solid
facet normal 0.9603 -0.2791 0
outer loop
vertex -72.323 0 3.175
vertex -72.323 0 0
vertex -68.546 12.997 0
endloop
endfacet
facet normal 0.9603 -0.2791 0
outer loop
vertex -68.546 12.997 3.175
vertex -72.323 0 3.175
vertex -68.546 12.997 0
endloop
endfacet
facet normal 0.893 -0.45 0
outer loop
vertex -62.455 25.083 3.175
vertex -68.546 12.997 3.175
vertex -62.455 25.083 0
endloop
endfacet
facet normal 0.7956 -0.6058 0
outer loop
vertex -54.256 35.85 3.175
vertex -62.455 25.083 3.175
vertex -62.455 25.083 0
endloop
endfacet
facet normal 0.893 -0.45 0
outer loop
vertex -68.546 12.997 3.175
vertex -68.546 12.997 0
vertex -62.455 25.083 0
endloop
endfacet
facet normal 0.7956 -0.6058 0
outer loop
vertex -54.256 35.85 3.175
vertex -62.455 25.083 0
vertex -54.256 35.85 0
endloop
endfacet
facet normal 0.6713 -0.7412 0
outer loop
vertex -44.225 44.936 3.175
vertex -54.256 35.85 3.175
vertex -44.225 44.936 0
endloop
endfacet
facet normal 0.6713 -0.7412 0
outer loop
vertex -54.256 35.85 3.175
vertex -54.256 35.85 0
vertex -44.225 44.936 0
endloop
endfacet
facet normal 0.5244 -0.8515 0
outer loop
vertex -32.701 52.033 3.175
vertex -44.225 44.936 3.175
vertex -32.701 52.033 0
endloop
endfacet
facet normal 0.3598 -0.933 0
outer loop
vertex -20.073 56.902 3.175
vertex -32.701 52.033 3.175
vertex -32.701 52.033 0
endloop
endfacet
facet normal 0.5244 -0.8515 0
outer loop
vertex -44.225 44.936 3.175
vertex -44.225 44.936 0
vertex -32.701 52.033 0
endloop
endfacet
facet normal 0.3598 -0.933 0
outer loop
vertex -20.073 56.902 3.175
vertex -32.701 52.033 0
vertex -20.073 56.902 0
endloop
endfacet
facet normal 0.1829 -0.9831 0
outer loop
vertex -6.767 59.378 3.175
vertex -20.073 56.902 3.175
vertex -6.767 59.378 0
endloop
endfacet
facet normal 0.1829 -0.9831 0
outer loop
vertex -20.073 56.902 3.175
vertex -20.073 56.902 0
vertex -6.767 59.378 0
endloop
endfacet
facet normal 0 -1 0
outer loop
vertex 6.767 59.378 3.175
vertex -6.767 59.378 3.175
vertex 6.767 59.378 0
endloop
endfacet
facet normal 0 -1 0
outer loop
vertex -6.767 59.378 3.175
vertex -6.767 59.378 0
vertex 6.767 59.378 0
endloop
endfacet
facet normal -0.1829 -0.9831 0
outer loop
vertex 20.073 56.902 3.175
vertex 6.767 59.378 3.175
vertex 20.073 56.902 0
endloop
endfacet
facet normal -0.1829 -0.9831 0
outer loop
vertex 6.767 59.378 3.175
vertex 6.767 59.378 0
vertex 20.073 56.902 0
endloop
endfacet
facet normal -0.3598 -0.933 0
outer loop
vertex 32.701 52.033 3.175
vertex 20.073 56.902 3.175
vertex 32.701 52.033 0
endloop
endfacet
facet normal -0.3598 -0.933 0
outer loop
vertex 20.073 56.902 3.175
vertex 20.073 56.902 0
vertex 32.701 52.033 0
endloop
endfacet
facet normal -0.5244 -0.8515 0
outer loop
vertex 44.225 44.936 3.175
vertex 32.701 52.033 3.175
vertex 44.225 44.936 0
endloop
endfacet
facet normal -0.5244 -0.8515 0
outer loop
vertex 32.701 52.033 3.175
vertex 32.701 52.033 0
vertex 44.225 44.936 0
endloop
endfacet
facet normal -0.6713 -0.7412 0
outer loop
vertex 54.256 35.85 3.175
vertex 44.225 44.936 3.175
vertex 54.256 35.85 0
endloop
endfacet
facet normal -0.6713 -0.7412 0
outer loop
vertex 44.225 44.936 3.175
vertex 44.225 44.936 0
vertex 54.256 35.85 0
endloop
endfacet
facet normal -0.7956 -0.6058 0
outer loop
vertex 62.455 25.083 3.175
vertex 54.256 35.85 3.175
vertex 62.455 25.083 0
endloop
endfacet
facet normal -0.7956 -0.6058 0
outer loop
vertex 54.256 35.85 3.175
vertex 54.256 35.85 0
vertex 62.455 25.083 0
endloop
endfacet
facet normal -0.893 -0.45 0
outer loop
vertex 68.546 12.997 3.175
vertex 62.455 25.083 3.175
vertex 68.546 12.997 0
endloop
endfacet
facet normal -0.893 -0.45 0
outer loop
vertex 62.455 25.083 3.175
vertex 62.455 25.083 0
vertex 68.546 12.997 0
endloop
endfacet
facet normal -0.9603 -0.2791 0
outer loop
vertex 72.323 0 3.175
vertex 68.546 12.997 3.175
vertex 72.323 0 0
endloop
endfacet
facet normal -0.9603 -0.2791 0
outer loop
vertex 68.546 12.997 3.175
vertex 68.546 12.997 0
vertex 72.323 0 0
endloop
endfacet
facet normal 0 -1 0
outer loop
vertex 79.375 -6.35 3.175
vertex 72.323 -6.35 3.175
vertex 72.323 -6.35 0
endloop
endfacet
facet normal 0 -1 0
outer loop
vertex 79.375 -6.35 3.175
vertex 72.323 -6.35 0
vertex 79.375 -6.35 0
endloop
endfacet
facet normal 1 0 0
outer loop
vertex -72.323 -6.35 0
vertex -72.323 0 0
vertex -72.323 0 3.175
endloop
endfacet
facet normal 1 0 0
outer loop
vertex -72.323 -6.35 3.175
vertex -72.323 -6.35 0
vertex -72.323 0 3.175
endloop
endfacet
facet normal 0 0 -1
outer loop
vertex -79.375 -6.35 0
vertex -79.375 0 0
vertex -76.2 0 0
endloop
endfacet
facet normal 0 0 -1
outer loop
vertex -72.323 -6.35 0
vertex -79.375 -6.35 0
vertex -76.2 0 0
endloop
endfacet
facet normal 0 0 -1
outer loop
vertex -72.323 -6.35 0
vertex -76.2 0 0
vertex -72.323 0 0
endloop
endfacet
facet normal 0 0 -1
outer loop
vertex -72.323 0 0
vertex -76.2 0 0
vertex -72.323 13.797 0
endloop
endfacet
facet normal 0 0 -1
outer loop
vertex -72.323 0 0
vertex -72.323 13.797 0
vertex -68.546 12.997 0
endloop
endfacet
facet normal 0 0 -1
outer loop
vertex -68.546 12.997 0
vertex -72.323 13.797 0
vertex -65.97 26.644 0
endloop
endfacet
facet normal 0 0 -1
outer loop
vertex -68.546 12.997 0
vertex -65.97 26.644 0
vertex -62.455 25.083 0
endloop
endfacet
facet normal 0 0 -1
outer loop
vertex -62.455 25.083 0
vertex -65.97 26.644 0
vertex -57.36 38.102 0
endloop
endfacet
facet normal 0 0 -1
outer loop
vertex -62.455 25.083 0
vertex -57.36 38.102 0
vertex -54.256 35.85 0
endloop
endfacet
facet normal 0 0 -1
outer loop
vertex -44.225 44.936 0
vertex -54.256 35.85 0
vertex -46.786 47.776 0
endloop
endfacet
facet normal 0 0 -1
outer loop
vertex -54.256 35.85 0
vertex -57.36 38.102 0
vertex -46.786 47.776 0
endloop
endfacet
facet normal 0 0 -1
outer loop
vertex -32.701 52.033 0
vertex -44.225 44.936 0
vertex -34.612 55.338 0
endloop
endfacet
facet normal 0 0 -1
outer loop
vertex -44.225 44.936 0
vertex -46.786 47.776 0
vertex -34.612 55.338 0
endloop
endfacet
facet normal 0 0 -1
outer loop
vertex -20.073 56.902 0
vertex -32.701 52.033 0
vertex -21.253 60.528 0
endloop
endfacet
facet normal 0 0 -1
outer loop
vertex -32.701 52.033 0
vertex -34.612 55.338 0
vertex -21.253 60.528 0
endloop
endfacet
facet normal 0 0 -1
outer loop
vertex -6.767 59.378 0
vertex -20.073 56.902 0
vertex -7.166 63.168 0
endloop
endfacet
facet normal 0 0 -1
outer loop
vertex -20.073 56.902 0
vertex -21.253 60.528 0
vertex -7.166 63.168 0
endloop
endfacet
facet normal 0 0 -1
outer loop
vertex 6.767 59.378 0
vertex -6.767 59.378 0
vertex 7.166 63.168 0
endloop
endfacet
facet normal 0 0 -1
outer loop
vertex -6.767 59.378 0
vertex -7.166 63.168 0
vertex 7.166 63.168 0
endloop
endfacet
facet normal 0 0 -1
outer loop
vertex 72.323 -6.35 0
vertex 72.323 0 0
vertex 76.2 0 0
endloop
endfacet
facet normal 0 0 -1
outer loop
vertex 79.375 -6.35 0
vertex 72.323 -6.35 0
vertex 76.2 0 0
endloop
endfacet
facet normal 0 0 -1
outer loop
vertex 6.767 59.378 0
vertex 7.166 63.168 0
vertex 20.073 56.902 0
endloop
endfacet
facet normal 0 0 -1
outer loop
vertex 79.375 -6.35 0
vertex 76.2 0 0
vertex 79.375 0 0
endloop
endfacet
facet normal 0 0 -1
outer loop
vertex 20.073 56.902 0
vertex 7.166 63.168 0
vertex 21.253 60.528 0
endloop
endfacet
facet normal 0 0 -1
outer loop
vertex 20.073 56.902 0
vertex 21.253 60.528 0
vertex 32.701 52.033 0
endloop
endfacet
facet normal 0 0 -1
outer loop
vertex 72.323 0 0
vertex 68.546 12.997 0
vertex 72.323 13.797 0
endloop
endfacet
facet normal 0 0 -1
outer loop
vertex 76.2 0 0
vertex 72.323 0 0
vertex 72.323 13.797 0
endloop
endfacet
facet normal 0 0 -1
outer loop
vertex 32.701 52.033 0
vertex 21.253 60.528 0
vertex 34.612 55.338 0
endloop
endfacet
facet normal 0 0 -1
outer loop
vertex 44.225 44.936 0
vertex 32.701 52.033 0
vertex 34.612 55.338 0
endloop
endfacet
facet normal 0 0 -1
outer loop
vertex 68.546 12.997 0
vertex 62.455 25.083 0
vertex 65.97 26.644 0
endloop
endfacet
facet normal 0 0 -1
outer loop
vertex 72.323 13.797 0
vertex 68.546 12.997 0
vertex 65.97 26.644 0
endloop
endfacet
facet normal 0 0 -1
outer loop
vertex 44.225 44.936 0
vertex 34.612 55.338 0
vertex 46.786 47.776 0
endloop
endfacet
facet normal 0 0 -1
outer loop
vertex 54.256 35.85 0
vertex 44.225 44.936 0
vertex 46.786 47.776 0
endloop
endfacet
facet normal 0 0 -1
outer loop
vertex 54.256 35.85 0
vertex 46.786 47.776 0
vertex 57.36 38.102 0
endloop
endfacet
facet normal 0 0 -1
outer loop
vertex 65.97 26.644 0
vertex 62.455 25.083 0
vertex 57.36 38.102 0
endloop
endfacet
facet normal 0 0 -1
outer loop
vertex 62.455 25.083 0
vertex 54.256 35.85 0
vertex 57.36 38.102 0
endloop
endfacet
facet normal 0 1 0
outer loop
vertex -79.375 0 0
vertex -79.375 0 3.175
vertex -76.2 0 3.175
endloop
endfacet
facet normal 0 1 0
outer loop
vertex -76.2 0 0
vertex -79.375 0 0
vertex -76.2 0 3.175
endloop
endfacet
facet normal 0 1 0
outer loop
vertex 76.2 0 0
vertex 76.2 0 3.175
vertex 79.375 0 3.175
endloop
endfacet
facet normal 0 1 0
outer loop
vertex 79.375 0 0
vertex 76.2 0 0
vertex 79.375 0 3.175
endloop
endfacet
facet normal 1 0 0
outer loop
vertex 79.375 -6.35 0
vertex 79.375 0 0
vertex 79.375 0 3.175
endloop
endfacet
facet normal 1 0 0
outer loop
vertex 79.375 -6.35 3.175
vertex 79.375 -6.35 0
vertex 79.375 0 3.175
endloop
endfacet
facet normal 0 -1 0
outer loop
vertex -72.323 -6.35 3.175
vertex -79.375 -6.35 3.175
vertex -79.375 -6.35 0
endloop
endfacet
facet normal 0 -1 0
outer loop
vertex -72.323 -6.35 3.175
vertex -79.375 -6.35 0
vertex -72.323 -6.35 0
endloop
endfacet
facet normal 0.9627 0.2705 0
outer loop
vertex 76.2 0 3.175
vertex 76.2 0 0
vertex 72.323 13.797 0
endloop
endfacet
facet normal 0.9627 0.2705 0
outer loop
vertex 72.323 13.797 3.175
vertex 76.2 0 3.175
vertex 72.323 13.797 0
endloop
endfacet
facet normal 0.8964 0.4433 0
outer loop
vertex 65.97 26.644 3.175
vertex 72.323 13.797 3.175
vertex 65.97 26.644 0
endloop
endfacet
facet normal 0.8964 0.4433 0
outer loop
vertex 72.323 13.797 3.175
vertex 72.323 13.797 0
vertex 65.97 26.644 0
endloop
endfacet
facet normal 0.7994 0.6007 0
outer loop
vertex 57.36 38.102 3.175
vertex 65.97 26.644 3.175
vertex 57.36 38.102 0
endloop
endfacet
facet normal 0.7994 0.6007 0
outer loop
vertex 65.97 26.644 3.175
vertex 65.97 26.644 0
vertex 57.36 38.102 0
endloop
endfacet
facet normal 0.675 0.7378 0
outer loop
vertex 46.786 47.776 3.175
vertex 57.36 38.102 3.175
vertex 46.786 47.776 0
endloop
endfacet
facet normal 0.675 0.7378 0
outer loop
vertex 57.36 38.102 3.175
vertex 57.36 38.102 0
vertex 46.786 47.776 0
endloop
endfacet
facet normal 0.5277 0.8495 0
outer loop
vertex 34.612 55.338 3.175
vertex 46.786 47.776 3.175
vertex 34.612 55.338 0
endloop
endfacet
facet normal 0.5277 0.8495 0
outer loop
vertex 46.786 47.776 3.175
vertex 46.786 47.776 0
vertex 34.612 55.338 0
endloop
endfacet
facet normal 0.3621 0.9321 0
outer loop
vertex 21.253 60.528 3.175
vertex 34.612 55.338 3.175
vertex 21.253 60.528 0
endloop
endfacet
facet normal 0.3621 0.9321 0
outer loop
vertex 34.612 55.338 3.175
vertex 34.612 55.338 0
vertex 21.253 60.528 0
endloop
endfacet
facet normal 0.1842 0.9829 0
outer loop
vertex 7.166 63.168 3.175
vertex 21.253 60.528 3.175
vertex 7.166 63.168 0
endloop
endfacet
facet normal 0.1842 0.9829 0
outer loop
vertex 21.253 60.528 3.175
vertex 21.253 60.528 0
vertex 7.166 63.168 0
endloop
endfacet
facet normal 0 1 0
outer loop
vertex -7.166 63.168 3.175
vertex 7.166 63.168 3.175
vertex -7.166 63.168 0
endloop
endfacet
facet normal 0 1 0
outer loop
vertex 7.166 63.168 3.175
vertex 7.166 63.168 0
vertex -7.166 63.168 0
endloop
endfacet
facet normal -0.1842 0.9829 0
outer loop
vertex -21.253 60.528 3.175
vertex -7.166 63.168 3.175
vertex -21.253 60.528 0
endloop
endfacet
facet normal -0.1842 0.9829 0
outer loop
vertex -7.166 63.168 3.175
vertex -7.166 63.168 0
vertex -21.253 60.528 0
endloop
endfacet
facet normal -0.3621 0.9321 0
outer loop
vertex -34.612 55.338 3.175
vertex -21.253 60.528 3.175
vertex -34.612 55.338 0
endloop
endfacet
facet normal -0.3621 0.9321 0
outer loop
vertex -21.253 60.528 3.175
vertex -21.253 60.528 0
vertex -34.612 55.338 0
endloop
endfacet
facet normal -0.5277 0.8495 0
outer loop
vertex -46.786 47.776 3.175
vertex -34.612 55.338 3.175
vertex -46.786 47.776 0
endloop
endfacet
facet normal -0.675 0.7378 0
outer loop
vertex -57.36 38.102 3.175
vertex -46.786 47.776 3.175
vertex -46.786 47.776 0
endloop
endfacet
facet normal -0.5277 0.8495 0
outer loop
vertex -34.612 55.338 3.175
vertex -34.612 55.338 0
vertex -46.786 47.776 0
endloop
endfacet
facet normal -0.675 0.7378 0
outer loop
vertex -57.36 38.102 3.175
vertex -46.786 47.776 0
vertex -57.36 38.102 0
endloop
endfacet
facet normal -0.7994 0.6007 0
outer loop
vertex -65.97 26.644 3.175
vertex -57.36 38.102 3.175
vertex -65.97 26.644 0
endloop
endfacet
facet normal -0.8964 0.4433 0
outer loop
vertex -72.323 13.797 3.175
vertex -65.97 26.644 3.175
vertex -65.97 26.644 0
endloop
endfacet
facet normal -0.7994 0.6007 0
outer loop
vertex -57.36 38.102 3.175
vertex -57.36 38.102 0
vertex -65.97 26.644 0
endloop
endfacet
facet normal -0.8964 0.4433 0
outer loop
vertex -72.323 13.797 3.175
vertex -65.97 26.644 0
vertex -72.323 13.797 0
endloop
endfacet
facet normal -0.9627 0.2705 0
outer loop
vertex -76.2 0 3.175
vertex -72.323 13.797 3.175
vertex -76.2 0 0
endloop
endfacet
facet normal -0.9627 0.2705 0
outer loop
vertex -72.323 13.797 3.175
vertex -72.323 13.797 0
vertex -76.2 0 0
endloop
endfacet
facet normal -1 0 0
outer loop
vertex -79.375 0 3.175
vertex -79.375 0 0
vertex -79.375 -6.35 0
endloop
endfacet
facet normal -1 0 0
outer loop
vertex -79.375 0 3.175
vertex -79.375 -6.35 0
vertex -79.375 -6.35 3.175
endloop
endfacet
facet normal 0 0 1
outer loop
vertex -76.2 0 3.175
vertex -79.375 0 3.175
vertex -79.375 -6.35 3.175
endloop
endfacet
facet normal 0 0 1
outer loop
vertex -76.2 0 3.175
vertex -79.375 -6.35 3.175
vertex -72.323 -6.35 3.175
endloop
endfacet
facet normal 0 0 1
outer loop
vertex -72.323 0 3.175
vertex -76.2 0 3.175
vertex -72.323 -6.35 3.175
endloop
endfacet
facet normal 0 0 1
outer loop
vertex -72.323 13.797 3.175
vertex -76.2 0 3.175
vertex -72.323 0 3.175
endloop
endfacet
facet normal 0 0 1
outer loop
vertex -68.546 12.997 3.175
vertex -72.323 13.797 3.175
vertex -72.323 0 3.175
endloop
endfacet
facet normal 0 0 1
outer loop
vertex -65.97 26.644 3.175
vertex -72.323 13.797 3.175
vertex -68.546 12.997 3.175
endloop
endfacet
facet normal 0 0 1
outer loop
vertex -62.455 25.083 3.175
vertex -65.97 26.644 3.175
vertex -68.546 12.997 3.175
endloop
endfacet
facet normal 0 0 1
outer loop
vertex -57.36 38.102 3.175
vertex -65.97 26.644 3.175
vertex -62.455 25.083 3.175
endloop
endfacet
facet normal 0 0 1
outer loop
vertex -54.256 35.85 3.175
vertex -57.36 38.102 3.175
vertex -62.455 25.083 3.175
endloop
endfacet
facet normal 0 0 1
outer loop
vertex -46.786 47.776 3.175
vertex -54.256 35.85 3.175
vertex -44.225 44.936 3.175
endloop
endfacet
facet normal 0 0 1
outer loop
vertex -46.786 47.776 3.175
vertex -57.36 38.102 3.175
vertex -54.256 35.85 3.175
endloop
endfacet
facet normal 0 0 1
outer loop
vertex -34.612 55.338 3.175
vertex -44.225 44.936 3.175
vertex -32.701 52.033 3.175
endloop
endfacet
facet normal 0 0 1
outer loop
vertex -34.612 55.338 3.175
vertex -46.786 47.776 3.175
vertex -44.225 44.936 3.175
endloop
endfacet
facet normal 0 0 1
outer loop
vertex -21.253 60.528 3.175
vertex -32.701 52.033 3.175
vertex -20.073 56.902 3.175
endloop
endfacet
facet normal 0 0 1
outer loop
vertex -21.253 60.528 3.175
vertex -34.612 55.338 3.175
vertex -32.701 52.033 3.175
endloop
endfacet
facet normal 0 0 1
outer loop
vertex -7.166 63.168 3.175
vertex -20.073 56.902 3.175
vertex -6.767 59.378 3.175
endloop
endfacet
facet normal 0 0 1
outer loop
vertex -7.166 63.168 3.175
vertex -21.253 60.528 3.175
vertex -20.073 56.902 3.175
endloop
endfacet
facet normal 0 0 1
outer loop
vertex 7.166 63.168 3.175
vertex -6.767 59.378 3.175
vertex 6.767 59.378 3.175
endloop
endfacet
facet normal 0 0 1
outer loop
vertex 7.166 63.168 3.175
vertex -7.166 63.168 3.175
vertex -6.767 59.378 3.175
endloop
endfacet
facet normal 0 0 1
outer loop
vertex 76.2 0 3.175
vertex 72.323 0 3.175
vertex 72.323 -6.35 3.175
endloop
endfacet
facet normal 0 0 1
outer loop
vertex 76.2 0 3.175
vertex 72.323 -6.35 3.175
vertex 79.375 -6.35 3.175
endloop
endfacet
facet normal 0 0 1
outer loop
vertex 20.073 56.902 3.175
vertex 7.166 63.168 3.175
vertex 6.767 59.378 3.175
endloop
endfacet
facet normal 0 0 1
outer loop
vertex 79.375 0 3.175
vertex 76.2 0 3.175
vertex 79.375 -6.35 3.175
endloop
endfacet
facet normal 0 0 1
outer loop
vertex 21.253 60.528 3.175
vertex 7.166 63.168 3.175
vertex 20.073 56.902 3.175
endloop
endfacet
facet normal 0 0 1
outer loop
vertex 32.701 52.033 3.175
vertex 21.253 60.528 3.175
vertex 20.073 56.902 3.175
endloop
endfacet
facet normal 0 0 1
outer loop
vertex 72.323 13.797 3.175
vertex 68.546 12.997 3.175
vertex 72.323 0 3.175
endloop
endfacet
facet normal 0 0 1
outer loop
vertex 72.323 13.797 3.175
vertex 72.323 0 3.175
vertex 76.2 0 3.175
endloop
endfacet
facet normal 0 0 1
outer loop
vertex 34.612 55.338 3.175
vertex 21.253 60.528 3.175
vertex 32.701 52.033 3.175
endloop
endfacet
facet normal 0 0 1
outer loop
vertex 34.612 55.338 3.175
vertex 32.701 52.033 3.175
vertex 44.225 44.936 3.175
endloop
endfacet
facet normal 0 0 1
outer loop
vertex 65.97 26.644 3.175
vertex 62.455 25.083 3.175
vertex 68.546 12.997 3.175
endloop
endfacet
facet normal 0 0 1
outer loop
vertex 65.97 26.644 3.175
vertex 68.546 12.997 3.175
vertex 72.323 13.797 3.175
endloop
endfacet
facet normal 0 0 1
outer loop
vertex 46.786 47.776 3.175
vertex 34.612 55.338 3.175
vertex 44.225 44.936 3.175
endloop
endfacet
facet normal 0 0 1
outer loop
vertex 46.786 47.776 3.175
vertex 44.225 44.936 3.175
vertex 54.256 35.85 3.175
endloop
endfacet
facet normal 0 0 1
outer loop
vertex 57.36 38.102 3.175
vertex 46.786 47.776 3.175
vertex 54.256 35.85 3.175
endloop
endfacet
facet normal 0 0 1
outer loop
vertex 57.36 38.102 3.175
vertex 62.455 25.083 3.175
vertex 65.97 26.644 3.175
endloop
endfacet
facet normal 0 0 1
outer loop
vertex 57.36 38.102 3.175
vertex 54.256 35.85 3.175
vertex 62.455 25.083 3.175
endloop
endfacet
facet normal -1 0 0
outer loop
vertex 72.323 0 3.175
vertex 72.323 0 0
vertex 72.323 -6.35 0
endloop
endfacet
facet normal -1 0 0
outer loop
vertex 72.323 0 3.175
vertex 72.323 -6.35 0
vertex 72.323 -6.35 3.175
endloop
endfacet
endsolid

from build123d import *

# Parameters (mm, degrees)
BOSS_EXTRUDE1_DEPTH = 3.175
SKETCH2_W           = 7.051872993
SKETCH2_H           = 3.175
BOSS_EXTRUDE2_DEPTH = 6.35


with BuildPart() as part:
    # Sketch1 → Boss-Extrude1 (new body)
    with BuildSketch(Plane.XY):
        with BuildLine():
            Line((-76.2, 0), (-72.323127007, 0))
            ThreePointArc((-72.323127007, 0), (0, 59.69), (72.323127007, 0))
            Line((72.323127007, 0), (76.2, 0))
            ThreePointArc((76.2, 0), (0, 63.5), (-76.2, 0))
        make_face()
    extrude(amount=BOSS_EXTRUDE1_DEPTH)

    # Sketch2 → Boss-Extrude2 (add)
    with BuildSketch(Plane.XZ):
        with Locations((75.849063504, 1.5875)):
            Rectangle(SKETCH2_W, SKETCH2_H)
        with Locations((-75.849063504, 1.5875)):
            Rectangle(SKETCH2_W, SKETCH2_H)
    extrude(amount=BOSS_EXTRUDE2_DEPTH)


solid = part.part
